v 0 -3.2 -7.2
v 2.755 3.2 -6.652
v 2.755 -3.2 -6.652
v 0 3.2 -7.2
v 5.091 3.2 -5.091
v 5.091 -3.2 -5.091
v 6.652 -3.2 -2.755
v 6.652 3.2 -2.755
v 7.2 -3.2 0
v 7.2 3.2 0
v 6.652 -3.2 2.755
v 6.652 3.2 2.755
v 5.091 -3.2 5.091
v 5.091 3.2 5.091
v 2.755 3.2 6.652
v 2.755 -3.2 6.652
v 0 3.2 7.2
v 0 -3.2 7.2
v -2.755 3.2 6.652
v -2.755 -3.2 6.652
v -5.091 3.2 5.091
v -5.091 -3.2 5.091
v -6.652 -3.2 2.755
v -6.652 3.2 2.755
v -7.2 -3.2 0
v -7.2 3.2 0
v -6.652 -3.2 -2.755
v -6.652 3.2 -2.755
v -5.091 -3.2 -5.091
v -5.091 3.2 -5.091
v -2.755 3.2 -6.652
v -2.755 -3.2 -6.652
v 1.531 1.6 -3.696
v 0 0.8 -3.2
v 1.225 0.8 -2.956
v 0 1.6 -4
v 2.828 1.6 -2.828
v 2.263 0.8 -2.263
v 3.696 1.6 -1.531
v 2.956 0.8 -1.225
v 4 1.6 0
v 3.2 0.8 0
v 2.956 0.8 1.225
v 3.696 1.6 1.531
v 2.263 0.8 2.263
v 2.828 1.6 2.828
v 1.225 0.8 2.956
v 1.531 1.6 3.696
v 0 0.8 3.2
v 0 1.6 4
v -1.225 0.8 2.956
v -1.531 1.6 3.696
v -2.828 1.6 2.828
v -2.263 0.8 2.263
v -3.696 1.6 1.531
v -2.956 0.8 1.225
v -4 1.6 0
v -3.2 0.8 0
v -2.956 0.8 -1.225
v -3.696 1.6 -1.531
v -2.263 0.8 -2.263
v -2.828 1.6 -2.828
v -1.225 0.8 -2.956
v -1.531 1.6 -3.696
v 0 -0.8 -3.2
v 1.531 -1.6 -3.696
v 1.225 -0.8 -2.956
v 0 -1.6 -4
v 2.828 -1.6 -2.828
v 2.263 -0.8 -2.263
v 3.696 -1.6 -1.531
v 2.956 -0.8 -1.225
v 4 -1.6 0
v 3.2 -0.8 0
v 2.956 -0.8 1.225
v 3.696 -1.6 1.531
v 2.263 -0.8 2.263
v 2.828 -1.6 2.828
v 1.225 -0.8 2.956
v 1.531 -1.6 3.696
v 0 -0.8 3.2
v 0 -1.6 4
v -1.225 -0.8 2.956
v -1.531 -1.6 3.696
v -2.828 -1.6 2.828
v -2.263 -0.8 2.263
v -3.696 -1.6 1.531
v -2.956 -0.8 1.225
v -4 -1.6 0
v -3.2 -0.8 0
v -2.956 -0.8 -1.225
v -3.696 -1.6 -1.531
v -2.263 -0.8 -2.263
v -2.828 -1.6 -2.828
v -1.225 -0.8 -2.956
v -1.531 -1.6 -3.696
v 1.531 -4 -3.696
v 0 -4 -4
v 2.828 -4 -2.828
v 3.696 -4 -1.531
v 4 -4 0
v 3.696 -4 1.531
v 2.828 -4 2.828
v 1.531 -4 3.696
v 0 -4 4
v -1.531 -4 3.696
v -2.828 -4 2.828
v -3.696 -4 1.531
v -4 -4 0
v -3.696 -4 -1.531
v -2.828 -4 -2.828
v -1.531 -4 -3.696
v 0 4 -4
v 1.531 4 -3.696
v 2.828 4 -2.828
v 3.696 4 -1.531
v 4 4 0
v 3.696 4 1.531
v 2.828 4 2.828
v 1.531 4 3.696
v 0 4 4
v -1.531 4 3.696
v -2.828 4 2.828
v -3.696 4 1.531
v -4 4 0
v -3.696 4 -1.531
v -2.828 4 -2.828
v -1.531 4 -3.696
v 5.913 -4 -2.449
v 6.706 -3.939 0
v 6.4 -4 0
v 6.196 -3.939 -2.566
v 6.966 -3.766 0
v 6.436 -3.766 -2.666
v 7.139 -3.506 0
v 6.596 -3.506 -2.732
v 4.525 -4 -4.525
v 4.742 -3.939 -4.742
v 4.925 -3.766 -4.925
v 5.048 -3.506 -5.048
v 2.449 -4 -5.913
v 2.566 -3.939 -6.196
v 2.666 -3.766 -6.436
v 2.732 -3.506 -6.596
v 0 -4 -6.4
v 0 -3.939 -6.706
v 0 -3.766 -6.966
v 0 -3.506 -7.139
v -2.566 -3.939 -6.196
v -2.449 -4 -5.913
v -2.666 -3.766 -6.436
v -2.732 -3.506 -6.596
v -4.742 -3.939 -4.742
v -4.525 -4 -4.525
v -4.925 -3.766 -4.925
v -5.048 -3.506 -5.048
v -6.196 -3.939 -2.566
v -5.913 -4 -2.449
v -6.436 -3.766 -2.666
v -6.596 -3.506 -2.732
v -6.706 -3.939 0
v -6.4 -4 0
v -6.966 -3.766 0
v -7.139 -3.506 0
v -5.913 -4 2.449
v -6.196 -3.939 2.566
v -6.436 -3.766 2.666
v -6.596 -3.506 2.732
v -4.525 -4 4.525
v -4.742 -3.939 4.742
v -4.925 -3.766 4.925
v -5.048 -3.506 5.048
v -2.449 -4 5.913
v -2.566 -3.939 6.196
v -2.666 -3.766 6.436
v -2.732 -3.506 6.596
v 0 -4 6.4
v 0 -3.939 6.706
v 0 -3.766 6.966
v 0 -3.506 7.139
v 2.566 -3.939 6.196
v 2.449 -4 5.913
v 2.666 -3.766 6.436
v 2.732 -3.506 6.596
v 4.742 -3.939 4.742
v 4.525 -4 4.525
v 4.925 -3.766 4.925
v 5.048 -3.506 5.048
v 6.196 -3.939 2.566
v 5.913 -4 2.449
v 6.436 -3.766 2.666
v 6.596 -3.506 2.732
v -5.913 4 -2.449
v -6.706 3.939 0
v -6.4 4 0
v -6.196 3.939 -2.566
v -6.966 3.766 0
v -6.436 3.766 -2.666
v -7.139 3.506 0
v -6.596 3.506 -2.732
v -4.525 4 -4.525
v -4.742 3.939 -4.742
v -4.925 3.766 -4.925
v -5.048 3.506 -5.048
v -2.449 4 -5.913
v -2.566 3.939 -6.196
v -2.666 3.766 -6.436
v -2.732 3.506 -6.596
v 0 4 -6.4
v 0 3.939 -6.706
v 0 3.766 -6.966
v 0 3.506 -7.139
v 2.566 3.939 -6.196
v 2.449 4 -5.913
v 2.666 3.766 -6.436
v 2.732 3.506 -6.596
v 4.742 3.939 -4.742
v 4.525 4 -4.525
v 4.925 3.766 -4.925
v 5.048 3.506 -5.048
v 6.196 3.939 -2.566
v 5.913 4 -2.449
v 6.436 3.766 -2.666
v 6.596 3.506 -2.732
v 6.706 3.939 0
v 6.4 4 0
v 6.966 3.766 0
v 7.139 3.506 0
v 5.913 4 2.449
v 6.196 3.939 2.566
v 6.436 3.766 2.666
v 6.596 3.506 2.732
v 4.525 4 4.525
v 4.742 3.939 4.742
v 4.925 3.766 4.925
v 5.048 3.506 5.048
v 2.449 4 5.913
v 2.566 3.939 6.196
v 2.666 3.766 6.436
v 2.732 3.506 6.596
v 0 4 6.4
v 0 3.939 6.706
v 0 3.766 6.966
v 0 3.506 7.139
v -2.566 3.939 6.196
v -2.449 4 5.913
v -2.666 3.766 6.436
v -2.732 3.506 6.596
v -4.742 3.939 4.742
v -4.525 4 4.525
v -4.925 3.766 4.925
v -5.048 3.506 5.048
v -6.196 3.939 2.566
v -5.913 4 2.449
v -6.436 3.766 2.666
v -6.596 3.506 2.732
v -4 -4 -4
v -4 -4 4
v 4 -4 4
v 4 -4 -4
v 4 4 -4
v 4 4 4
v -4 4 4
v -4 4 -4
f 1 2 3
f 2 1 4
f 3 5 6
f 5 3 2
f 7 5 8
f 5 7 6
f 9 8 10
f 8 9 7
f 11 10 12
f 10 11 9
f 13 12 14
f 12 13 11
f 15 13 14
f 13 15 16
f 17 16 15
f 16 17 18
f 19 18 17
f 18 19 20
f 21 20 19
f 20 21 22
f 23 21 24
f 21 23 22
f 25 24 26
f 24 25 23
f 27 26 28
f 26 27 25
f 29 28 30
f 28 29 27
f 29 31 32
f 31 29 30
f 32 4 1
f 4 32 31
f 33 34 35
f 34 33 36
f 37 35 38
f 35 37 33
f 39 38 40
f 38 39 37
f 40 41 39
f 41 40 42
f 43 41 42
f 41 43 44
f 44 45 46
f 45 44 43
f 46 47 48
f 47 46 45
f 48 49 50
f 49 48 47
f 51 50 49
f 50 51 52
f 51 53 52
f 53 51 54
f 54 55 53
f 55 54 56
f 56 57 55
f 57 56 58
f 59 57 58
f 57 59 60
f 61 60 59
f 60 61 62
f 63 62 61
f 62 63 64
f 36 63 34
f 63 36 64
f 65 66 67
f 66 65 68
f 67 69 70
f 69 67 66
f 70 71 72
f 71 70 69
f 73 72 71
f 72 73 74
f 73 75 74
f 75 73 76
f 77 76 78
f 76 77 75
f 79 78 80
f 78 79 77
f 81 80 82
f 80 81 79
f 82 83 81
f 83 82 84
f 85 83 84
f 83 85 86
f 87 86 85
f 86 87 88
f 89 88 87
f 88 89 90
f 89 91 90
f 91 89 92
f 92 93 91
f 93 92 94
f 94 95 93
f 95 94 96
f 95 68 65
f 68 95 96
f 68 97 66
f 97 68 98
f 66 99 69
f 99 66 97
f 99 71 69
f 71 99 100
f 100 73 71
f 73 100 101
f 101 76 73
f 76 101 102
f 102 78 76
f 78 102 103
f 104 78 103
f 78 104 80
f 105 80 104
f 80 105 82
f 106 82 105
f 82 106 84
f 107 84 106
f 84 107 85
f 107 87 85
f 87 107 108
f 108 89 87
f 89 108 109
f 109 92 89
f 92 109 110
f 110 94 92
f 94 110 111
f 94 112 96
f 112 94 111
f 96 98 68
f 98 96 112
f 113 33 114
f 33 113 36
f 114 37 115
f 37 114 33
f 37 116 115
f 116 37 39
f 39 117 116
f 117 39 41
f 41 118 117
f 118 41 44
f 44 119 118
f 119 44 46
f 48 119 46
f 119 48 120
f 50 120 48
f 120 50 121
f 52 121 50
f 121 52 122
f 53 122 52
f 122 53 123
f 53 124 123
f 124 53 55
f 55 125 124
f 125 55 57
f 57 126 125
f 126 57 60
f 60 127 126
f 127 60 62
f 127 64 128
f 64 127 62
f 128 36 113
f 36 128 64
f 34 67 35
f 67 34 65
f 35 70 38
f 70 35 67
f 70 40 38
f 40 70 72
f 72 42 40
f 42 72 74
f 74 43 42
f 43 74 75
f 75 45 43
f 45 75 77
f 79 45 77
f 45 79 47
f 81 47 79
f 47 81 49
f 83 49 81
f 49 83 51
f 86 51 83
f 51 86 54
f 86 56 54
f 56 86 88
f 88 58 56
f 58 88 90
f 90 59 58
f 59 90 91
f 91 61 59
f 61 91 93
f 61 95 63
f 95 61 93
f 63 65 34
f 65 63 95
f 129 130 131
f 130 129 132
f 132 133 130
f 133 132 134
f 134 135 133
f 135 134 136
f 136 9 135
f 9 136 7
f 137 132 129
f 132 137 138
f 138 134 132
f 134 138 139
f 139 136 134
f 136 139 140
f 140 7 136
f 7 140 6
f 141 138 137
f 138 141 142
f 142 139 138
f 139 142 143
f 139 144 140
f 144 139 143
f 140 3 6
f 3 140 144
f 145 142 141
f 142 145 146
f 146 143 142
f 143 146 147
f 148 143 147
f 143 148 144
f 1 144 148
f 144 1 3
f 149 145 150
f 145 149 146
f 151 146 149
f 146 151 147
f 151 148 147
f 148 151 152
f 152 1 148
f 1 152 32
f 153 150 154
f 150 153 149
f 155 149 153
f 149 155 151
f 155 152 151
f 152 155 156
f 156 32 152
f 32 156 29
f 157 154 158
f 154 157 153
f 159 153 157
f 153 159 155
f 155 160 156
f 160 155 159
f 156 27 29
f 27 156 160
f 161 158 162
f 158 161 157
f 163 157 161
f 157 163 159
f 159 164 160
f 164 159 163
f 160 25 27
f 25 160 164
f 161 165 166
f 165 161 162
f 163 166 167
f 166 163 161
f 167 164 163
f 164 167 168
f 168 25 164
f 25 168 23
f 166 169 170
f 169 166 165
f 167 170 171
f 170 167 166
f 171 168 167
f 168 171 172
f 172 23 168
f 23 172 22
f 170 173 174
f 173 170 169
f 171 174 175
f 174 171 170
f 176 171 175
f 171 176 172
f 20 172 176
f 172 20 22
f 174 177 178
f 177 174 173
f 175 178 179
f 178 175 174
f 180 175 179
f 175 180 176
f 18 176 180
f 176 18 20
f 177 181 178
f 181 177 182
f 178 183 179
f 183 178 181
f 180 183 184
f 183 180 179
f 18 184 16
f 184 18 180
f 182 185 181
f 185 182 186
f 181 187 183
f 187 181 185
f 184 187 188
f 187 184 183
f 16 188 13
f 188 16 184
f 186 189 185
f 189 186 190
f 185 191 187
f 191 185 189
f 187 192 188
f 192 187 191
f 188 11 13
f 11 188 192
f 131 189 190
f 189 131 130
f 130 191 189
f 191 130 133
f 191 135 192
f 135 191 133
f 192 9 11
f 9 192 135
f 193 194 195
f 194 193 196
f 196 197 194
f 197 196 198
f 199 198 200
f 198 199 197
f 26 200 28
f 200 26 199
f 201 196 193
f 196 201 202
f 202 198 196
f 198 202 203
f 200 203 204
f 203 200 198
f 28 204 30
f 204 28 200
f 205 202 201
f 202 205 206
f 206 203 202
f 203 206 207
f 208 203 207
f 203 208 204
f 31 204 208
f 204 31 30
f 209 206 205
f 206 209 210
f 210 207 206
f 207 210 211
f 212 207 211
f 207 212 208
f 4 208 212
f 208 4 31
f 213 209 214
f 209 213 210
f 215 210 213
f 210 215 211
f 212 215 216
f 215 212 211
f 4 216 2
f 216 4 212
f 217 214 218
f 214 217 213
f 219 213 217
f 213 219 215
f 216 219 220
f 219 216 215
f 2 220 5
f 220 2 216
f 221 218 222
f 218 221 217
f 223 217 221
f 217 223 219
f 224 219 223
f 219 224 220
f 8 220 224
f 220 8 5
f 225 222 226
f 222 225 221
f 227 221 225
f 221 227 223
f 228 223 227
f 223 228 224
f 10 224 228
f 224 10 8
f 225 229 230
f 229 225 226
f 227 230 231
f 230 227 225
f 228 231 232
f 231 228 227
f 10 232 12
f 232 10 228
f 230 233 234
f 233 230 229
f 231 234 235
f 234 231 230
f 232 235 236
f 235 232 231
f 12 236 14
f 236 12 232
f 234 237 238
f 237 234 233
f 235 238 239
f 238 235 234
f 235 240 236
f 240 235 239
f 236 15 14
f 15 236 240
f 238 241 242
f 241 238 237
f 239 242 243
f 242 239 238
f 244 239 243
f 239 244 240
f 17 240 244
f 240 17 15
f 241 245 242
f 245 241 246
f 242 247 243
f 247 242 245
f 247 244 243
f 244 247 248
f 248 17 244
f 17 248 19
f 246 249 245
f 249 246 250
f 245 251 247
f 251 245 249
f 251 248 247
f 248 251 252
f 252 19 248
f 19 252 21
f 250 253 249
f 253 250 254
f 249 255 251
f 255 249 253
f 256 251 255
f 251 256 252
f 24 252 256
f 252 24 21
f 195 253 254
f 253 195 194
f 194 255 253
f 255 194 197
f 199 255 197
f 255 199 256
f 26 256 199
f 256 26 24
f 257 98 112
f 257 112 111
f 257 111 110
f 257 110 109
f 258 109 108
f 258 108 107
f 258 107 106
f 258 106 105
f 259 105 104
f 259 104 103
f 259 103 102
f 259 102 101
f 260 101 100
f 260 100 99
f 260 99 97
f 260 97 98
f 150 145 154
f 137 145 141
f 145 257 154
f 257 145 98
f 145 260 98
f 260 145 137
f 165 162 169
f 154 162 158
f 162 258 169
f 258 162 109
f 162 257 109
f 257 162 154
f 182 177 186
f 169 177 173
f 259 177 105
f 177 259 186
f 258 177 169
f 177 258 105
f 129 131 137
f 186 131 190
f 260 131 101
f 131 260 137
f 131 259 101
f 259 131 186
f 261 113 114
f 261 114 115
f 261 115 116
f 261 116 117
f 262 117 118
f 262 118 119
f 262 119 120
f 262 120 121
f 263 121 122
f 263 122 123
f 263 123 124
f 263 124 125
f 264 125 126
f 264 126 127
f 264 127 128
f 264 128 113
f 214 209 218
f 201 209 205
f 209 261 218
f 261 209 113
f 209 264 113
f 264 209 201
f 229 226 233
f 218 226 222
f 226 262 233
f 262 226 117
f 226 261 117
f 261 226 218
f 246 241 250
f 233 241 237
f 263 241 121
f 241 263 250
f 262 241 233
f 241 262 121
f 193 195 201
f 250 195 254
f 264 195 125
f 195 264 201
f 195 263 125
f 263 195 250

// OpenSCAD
// file: ../p/4-4edge.scad
use <../lib.scad>
function ldraw_lib__4_4edge() = [
// 0 Circle 1.0
// 0 Name: 4-4edge.dat
// 0 Author: James Jessiman
// 0 !LDRAW_ORG Primitive UPDATE 2017-01
// 0 !LICENSE Licensed under CC BY 4.0 : see CAreadme.txt
// 
// 0 BFC CERTIFY CCW
  [0,"BFC","CERTIFY"],
  [0,"BFC","CCW"],
// 
// 0 !HISTORY 1998-12-15 [PTadmin] Official Update 1998-10
// 0 !HISTORY 2005-12-28 [PTadmin] Official Update 2005-01
// 0 !HISTORY 2007-06-24 [PTadmin] Header formatted for Contributor Agreement
// 0 !HISTORY 2008-07-01 [PTadmin] Official Update 2008-01
// 0 !HISTORY 2017-01-15 [Steffen] BFCed
// 0 !HISTORY 2017-12-30 [PTadmin] Official Update 2017-01
// 
// 
// 2 24 1 0 0 0.9239 0 0.3827
  [2,24,1,0,0,0.9239,0,0.3827],
// 2 24 0.9239 0 0.3827 0.7071 0 0.7071
  [2,24,0.9239,0,0.3827,0.7071,0,0.7071],
// 2 24 0.7071 0 0.7071 0.3827 0 0.9239
  [2,24,0.7071,0,0.7071,0.3827,0,0.9239],
// 2 24 0.3827 0 0.9239 0 0 1
  [2,24,0.3827,0,0.9239,0,0,1],
// 2 24 0 0 1 -0.3827 0 0.9239
  [2,24,0,0,1,-0.3827,0,0.9239],
// 2 24 -0.3827 0 0.9239 -0.7071 0 0.7071
  [2,24,-0.3827,0,0.9239,-0.7071,0,0.7071],
// 2 24 -0.7071 0 0.7071 -0.9239 0 0.3827
  [2,24,-0.7071,0,0.7071,-0.9239,0,0.3827],
// 2 24 -0.9239 0 0.3827 -1 0 -0
  [2,24,-0.9239,0,0.3827,-1,0,-0],
// 2 24 -1 0 -0 -0.9239 0 -0.3827
  [2,24,-1,0,-0,-0.9239,0,-0.3827],
// 2 24 -0.9239 0 -0.3827 -0.7071 0 -0.7071
  [2,24,-0.9239,0,-0.3827,-0.7071,0,-0.7071],
// 2 24 -0.7071 0 -0.7071 -0.3827 0 -0.9239
  [2,24,-0.7071,0,-0.7071,-0.3827,0,-0.9239],
// 2 24 -0.3827 0 -0.9239 0 0 -1
  [2,24,-0.3827,0,-0.9239,0,0,-1],
// 2 24 0 0 -1 0.3827 0 -0.9239
  [2,24,0,0,-1,0.3827,0,-0.9239],
// 2 24 0.3827 0 -0.9239 0.7071 0 -0.7071
  [2,24,0.3827,0,-0.9239,0.7071,0,-0.7071],
// 2 24 0.7071 0 -0.7071 0.9239 0 -0.3827
  [2,24,0.7071,0,-0.7071,0.9239,0,-0.3827],
// 2 24 0.9239 0 -0.3827 1 0 0
  [2,24,0.9239,0,-0.3827,1,0,0],
];
module ldraw_lib__4_4edge(step=0, col=false, unit=2/5, alt=false, line=0.2, solid=!$preview)
    makepoly(ldraw_lib__4_4edge(), step=step, col=col, unit=unit, alt=alt, line=line, solid=solid);
ldraw_lib__4_4edge(line=0.2);
// file: ../p/4-4ndis.scad
use <../lib.scad>
function ldraw_lib__4_4ndis() = [
// 0 Disc Negative 1.0
// 0 Name: 4-4ndis.dat
// 0 Author: James Jessiman
// 0 !LDRAW_ORG Primitive UPDATE 2012-01
// 0 !LICENSE Licensed under CC BY 4.0 : see CAreadme.txt
// 
// 0 BFC CERTIFY CCW
  [0,"BFC","CERTIFY"],
  [0,"BFC","CCW"],
// 
// 0 !HISTORY 2002-03-23 [sbliss] Added BFC statement; compacted code
// 0 !HISTORY 2002-04-25 [PTadmin] Official Update 2002-02
// 0 !HISTORY 2007-06-24 [PTadmin] Header formatted for Contributor Agreement
// 0 !HISTORY 2008-07-01 [PTadmin] Official Update 2008-01
// 0 !HISTORY 2012-02-16 [Philo] Changed to CCW
// 0 !HISTORY 2012-03-30 [PTadmin] Official Update 2012-01
// 
// 
// 3 16 0.9239 0 0.3827 1 0 0 1 0 1
  [3,16,0.9239,0,0.3827,1,0,0,1,0,1],
// 3 16 0.7071 0 0.7071 0.9239 0 0.3827 1 0 1
  [3,16,0.7071,0,0.7071,0.9239,0,0.3827,1,0,1],
// 3 16 0.3827 0 0.9239 0.7071 0 0.7071 1 0 1
  [3,16,0.3827,0,0.9239,0.7071,0,0.7071,1,0,1],
// 3 16 0 0 1 0.3827 0 0.9239 1 0 1
  [3,16,0,0,1,0.3827,0,0.9239,1,0,1],
// 3 16 -0.3827 0 0.9239 0 0 1 -1 0 1
  [3,16,-0.3827,0,0.9239,0,0,1,-1,0,1],
// 3 16 -0.7071 0 0.7071 -0.3827 0 0.9239 -1 0 1
  [3,16,-0.7071,0,0.7071,-0.3827,0,0.9239,-1,0,1],
// 3 16 -0.9239 0 0.3827 -0.7071 0 0.7071 -1 0 1
  [3,16,-0.9239,0,0.3827,-0.7071,0,0.7071,-1,0,1],
// 3 16 -1 0 0 -0.9239 0 0.3827 -1 0 1
  [3,16,-1,0,0,-0.9239,0,0.3827,-1,0,1],
// 3 16 -0.9239 0 -0.3827 -1 0 0 -1 0 -1
  [3,16,-0.9239,0,-0.3827,-1,0,0,-1,0,-1],
// 3 16 -0.7071 0 -0.7071 -0.9239 0 -0.3827 -1 0 -1
  [3,16,-0.7071,0,-0.7071,-0.9239,0,-0.3827,-1,0,-1],
// 3 16 -0.3827 0 -0.9239 -0.7071 0 -0.7071 -1 0 -1
  [3,16,-0.3827,0,-0.9239,-0.7071,0,-0.7071,-1,0,-1],
// 3 16 0 0 -1 -0.3827 0 -0.9239 -1 0 -1
  [3,16,0,0,-1,-0.3827,0,-0.9239,-1,0,-1],
// 3 16 0.3827 0 -0.9239 0 0 -1 1 0 -1
  [3,16,0.3827,0,-0.9239,0,0,-1,1,0,-1],
// 3 16 0.7071 0 -0.7071 0.3827 0 -0.9239 1 0 -1
  [3,16,0.7071,0,-0.7071,0.3827,0,-0.9239,1,0,-1],
// 3 16 0.9239 0 -0.3827 0.7071 0 -0.7071 1 0 -1
  [3,16,0.9239,0,-0.3827,0.7071,0,-0.7071,1,0,-1],
// 3 16 1 0 0 0.9239 0 -0.3827 1 0 -1
  [3,16,1,0,0,0.9239,0,-0.3827,1,0,-1],
];
module ldraw_lib__4_4ndis(step=0, col=false, unit=2/5, alt=false, line=0.2, solid=!$preview)
    makepoly(ldraw_lib__4_4ndis(), step=step, col=col, unit=unit, alt=alt, line=line, solid=solid);
ldraw_lib__4_4ndis(line=0.2);
// file: ../p/4-4cylo.scad
use <../lib.scad>
use <4-4cyli.scad>
use <4-4edge.scad>
function ldraw_lib__4_4cylo() = [
// 0 Cylinder Open 1.0
// 0 Name: 4-4cylo.dat
// 0 Author: Mark Kennedy [mkennedy]
// 0 !LDRAW_ORG Primitive UPDATE 2010-01
// 0 !LICENSE Licensed under CC BY 4.0 : see CAreadme.txt
// 
// 0 BFC CERTIFY CCW
  [0,"BFC","CERTIFY"],
  [0,"BFC","CCW"],
// 
// 0 !HISTORY 2010-04-05 [PTadmin] Official Update 2010-01
// 
// 
// 1 16 0 0 0 1 0 0 0 1 0 0 0 1 4-4edge.dat
  [1,16,0,0,0,1,0,0,0,1,0,0,0,1, ldraw_lib__4_4edge()],
// 1 16 0 1 0 1 0 0 0 1 0 0 0 1 4-4edge.dat
  [1,16,0,1,0,1,0,0,0,1,0,0,0,1, ldraw_lib__4_4edge()],
// 1 16 0 0 0 1 0 0 0 1 0 0 0 1 4-4cyli.dat
  [1,16,0,0,0,1,0,0,0,1,0,0,0,1, ldraw_lib__4_4cyli()],
// 0
];
module ldraw_lib__4_4cylo(step=0, col=false, unit=2/5, alt=false, line=0.2, solid=!$preview)
    makepoly(ldraw_lib__4_4cylo(), step=step, col=col, unit=unit, alt=alt, line=line, solid=solid);
ldraw_lib__4_4cylo(line=0.2);
// file: ../p/4-4cyli.scad
use <../lib.scad>
function ldraw_lib__4_4cyli() = [
// 0 Cylinder 1.0
// 0 Name: 4-4cyli.dat
// 0 Author: James Jessiman
// 0 !LDRAW_ORG Primitive UPDATE 2005-01
// 0 !LICENSE Licensed under CC BY 4.0 : see CAreadme.txt
// 
// 0 BFC CERTIFY CCW
  [0,"BFC","CERTIFY"],
  [0,"BFC","CCW"],
// 
// 0 !HISTORY 1998-12-15 [PTadmin] Official Update 1998-10
// 0 !HISTORY 2002-03-23 [sbliss] Added BFC statement; merged headers from files in distributions LDraw 0.27 and Complete.
// 0 !HISTORY 2002-04-25 [PTadmin] Official Update 2002-02
// 0 !HISTORY 2004-12-14 [guyvivan] BFC CCW
// 0 !HISTORY 2005-12-28 [PTadmin] Official Update 2005-01
// 0 !HISTORY 2007-06-24 [PTadmin] Header formatted for Contributor Agreement
// 0 !HISTORY 2008-07-01 [PTadmin] Official Update 2008-01
// 
// 
// 4 16 1 1 0 0.9239 1 0.3827 0.9239 0 0.3827 1 0 0
  [4,16,1,1,0,0.9239,1,0.3827,0.9239,0,0.3827,1,0,0],
// 5 24 1 0 0 1 1 0 0.9239 0 0.3827 0.9239 0 -0.3827
  [5,24,1,0,0,1,1,0,0.9239,0,0.3827,0.9239,0,-0.3827],
// 4 16 0.9239 1 0.3827 0.7071 1 0.7071 0.7071 0 0.7071 0.9239 0 0.3827
  [4,16,0.9239,1,0.3827,0.7071,1,0.7071,0.7071,0,0.7071,0.9239,0,0.3827],
// 5 24 0.9239 0 0.3827 0.9239 1 0.3827 0.7071 0 0.7071 1 0 0
  [5,24,0.9239,0,0.3827,0.9239,1,0.3827,0.7071,0,0.7071,1,0,0],
// 4 16 0.7071 1 0.7071 0.3827 1 0.9239 0.3827 0 0.9239 0.7071 0 0.7071
  [4,16,0.7071,1,0.7071,0.3827,1,0.9239,0.3827,0,0.9239,0.7071,0,0.7071],
// 5 24 0.7071 0 0.7071 0.7071 1 0.7071 0.3827 0 0.9239 0.9239 0 0.3827
  [5,24,0.7071,0,0.7071,0.7071,1,0.7071,0.3827,0,0.9239,0.9239,0,0.3827],
// 4 16 0.3827 1 0.9239 0 1 1 0 0 1 0.3827 0 0.9239
  [4,16,0.3827,1,0.9239,0,1,1,0,0,1,0.3827,0,0.9239],
// 5 24 0.3827 0 0.9239 0.3827 1 0.9239 0 0 1 0.7071 0 0.7071
  [5,24,0.3827,0,0.9239,0.3827,1,0.9239,0,0,1,0.7071,0,0.7071],
// 4 16 0 1 1 -0.3827 1 0.9239 -0.3827 0 0.9239 0 0 1
  [4,16,0,1,1,-0.3827,1,0.9239,-0.3827,0,0.9239,0,0,1],
// 5 24 0 0 1 0 1 1 -0.3827 0 0.9239 0.3827 0 0.9239
  [5,24,0,0,1,0,1,1,-0.3827,0,0.9239,0.3827,0,0.9239],
// 4 16 -0.3827 1 0.9239 -0.7071 1 0.7071 -0.7071 0 0.7071 -0.3827 0 0.9239
  [4,16,-0.3827,1,0.9239,-0.7071,1,0.7071,-0.7071,0,0.7071,-0.3827,0,0.9239],
// 5 24 -0.3827 0 0.9239 -0.3827 1 0.9239 -0.7071 0 0.7071 0 0 1
  [5,24,-0.3827,0,0.9239,-0.3827,1,0.9239,-0.7071,0,0.7071,0,0,1],
// 4 16 -0.7071 1 0.7071 -0.9239 1 0.3827 -0.9239 0 0.3827 -0.7071 0 0.7071
  [4,16,-0.7071,1,0.7071,-0.9239,1,0.3827,-0.9239,0,0.3827,-0.7071,0,0.7071],
// 5 24 -0.7071 0 0.7071 -0.7071 1 0.7071 -0.9239 0 0.3827 -0.3827 0 0.9239
  [5,24,-0.7071,0,0.7071,-0.7071,1,0.7071,-0.9239,0,0.3827,-0.3827,0,0.9239],
// 4 16 -0.9239 1 0.3827 -1 1 0 -1 0 0 -0.9239 0 0.3827
  [4,16,-0.9239,1,0.3827,-1,1,0,-1,0,0,-0.9239,0,0.3827],
// 5 24 -0.9239 0 0.3827 -0.9239 1 0.3827 -1 0 0 -0.7071 0 0.7071
  [5,24,-0.9239,0,0.3827,-0.9239,1,0.3827,-1,0,0,-0.7071,0,0.7071],
// 4 16 -1 1 0 -0.9239 1 -0.3827 -0.9239 0 -0.3827 -1 0 0
  [4,16,-1,1,0,-0.9239,1,-0.3827,-0.9239,0,-0.3827,-1,0,0],
// 5 24 -1 0 0 -1 1 0 -0.9239 0 -0.3827 -0.9239 0 0.3827
  [5,24,-1,0,0,-1,1,0,-0.9239,0,-0.3827,-0.9239,0,0.3827],
// 4 16 -0.9239 1 -0.3827 -0.7071 1 -0.7071 -0.7071 0 -0.7071 -0.9239 0 -0.3827
  [4,16,-0.9239,1,-0.3827,-0.7071,1,-0.7071,-0.7071,0,-0.7071,-0.9239,0,-0.3827],
// 5 24 -0.9239 0 -0.3827 -0.9239 1 -0.3827 -0.7071 0 -0.7071 -1 0 0
  [5,24,-0.9239,0,-0.3827,-0.9239,1,-0.3827,-0.7071,0,-0.7071,-1,0,0],
// 4 16 -0.7071 1 -0.7071 -0.3827 1 -0.9239 -0.3827 0 -0.9239 -0.7071 0 -0.7071
  [4,16,-0.7071,1,-0.7071,-0.3827,1,-0.9239,-0.3827,0,-0.9239,-0.7071,0,-0.7071],
// 5 24 -0.7071 0 -0.7071 -0.7071 1 -0.7071 -0.3827 0 -0.9239 -0.9239 0 -0.3827
  [5,24,-0.7071,0,-0.7071,-0.7071,1,-0.7071,-0.3827,0,-0.9239,-0.9239,0,-0.3827],
// 4 16 -0.3827 1 -0.9239 0 1 -1 0 0 -1 -0.3827 0 -0.9239
  [4,16,-0.3827,1,-0.9239,0,1,-1,0,0,-1,-0.3827,0,-0.9239],
// 5 24 -0.3827 0 -0.9239 -0.3827 1 -0.9239 0 0 -1 -0.7071 0 -0.7071
  [5,24,-0.3827,0,-0.9239,-0.3827,1,-0.9239,0,0,-1,-0.7071,0,-0.7071],
// 4 16 0 1 -1 0.3827 1 -0.9239 0.3827 0 -0.9239 0 0 -1
  [4,16,0,1,-1,0.3827,1,-0.9239,0.3827,0,-0.9239,0,0,-1],
// 5 24 0 0 -1 0 1 -1 0.3827 0 -0.9239 -0.3827 0 -0.9239
  [5,24,0,0,-1,0,1,-1,0.3827,0,-0.9239,-0.3827,0,-0.9239],
// 4 16 0.3827 1 -0.9239 0.7071 1 -0.7071 0.7071 0 -0.7071 0.3827 0 -0.9239
  [4,16,0.3827,1,-0.9239,0.7071,1,-0.7071,0.7071,0,-0.7071,0.3827,0,-0.9239],
// 5 24 0.3827 0 -0.9239 0.3827 1 -0.9239 0.7071 0 -0.7071 0 0 -1
  [5,24,0.3827,0,-0.9239,0.3827,1,-0.9239,0.7071,0,-0.7071,0,0,-1],
// 4 16 0.7071 1 -0.7071 0.9239 1 -0.3827 0.9239 0 -0.3827 0.7071 0 -0.7071
  [4,16,0.7071,1,-0.7071,0.9239,1,-0.3827,0.9239,0,-0.3827,0.7071,0,-0.7071],
// 5 24 0.7071 0 -0.7071 0.7071 1 -0.7071 0.9239 0 -0.3827 0.3827 0 -0.9239
  [5,24,0.7071,0,-0.7071,0.7071,1,-0.7071,0.9239,0,-0.3827,0.3827,0,-0.9239],
// 4 16 0.9239 1 -0.3827 1 1 0 1 0 0 0.9239 0 -0.3827
  [4,16,0.9239,1,-0.3827,1,1,0,1,0,0,0.9239,0,-0.3827],
// 5 24 0.9239 0 -0.3827 0.9239 1 -0.3827 1 0 0 0.7071 0 -0.7071
  [5,24,0.9239,0,-0.3827,0.9239,1,-0.3827,1,0,0,0.7071,0,-0.7071],
// 0
];
module ldraw_lib__4_4cyli(step=0, col=false, unit=2/5, alt=false, line=0.2, solid=!$preview)
    makepoly(ldraw_lib__4_4cyli(), step=step, col=col, unit=unit, alt=alt, line=line, solid=solid);
ldraw_lib__4_4cyli(line=0.2);
// file: ../p/4-4con4.scad
use <../lib.scad>
function ldraw_lib__4_4con4() = [
// 0 Cone  4 x 1.0
// 0 Name: 4-4con4.dat
// 0 Author: Willy Tschager [Holly-Wood]
// 0 !LDRAW_ORG Primitive UPDATE 2024-01
// 0 !LICENSE Licensed under CC BY 4.0 : see CAreadme.txt
// 
// 0 BFC CERTIFY CCW
  [0,"BFC","CERTIFY"],
  [0,"BFC","CCW"],
// 
// 0 !HISTORY 2003-08-01 [PTadmin] Official Update 2003-02
// 0 !HISTORY 2007-06-24 [PTadmin] Header formatted for Contributor Agreement
// 0 !HISTORY 2008-07-01 [PTadmin] Official Update 2008-01
// 0 !HISTORY 2012-02-16 [Philo] Changed to CCW
// 0 !HISTORY 2012-03-30 [PTadmin] Official Update 2012-01
// 0 !HISTORY 2024-01-07 [Holly-Wood] Complete regeneration, original by jriley
// 0 !HISTORY 2024-01-29 [OrionP] Official Update 2024-01
// 
// 4 16 4 1 0 3.6956 1 1.5308 4.6195 0 1.9135 5 0 0
  [4,16,4,1,0,3.6956,1,1.5308,4.6195,0,1.9135,5,0,0],
// 4 16 3.6956 1 1.5308 2.8284 1 2.8284 3.5355 0 3.5355 4.6195 0 1.9135
  [4,16,3.6956,1,1.5308,2.8284,1,2.8284,3.5355,0,3.5355,4.6195,0,1.9135],
// 4 16 2.8284 1 2.8284 1.5308 1 3.6956 1.9135 0 4.6195 3.5355 0 3.5355
  [4,16,2.8284,1,2.8284,1.5308,1,3.6956,1.9135,0,4.6195,3.5355,0,3.5355],
// 4 16 1.5308 1 3.6956 0 1 4 0 0 5 1.9135 0 4.6195
  [4,16,1.5308,1,3.6956,0,1,4,0,0,5,1.9135,0,4.6195],
// 4 16 0 1 4 -1.5308 1 3.6956 -1.9135 0 4.6195 0 0 5
  [4,16,0,1,4,-1.5308,1,3.6956,-1.9135,0,4.6195,0,0,5],
// 4 16 -1.5308 1 3.6956 -2.8284 1 2.8284 -3.5355 0 3.5355 -1.9135 0 4.6195
  [4,16,-1.5308,1,3.6956,-2.8284,1,2.8284,-3.5355,0,3.5355,-1.9135,0,4.6195],
// 4 16 -2.8284 1 2.8284 -3.6956 1 1.5308 -4.6195 0 1.9135 -3.5355 0 3.5355
  [4,16,-2.8284,1,2.8284,-3.6956,1,1.5308,-4.6195,0,1.9135,-3.5355,0,3.5355],
// 4 16 -3.6956 1 1.5308 -4 1 0 -5 0 0 -4.6195 0 1.9135
  [4,16,-3.6956,1,1.5308,-4,1,0,-5,0,0,-4.6195,0,1.9135],
// 4 16 -4 1 0 -3.6956 1 -1.5308 -4.6195 0 -1.9135 -5 0 0
  [4,16,-4,1,0,-3.6956,1,-1.5308,-4.6195,0,-1.9135,-5,0,0],
// 4 16 -3.6956 1 -1.5308 -2.8284 1 -2.8284 -3.5355 0 -3.5355 -4.6195 0 -1.9135
  [4,16,-3.6956,1,-1.5308,-2.8284,1,-2.8284,-3.5355,0,-3.5355,-4.6195,0,-1.9135],
// 4 16 -2.8284 1 -2.8284 -1.5308 1 -3.6956 -1.9135 0 -4.6195 -3.5355 0 -3.5355
  [4,16,-2.8284,1,-2.8284,-1.5308,1,-3.6956,-1.9135,0,-4.6195,-3.5355,0,-3.5355],
// 4 16 -1.5308 1 -3.6956 0 1 -4 0 0 -5 -1.9135 0 -4.6195
  [4,16,-1.5308,1,-3.6956,0,1,-4,0,0,-5,-1.9135,0,-4.6195],
// 4 16 0 1 -4 1.5308 1 -3.6956 1.9135 0 -4.6195 0 0 -5
  [4,16,0,1,-4,1.5308,1,-3.6956,1.9135,0,-4.6195,0,0,-5],
// 4 16 1.5308 1 -3.6956 2.8284 1 -2.8284 3.5355 0 -3.5355 1.9135 0 -4.6195
  [4,16,1.5308,1,-3.6956,2.8284,1,-2.8284,3.5355,0,-3.5355,1.9135,0,-4.6195],
// 4 16 2.8284 1 -2.8284 3.6956 1 -1.5308 4.6195 0 -1.9135 3.5355 0 -3.5355
  [4,16,2.8284,1,-2.8284,3.6956,1,-1.5308,4.6195,0,-1.9135,3.5355,0,-3.5355],
// 4 16 3.6956 1 -1.5308 4 1 0 5 0 0 4.6195 0 -1.9135
  [4,16,3.6956,1,-1.5308,4,1,0,5,0,0,4.6195,0,-1.9135],
// 0 // conditional lines
// 5 24 4 1 0 5 0 0 3.6956 1 -1.5308 3.6956 1 1.5308
  [5,24,4,1,0,5,0,0,3.6956,1,-1.5308,3.6956,1,1.5308],
// 5 24 3.6956 1 1.5308 4.6195 0 1.9135 4 1 0 2.8284 1 2.8284
  [5,24,3.6956,1,1.5308,4.6195,0,1.9135,4,1,0,2.8284,1,2.8284],
// 5 24 2.8284 1 2.8284 3.5355 0 3.5355 3.6956 1 1.5308 1.5308 1 3.6956
  [5,24,2.8284,1,2.8284,3.5355,0,3.5355,3.6956,1,1.5308,1.5308,1,3.6956],
// 5 24 1.5308 1 3.6956 1.9135 0 4.6195 2.8284 1 2.8284 0 1 4
  [5,24,1.5308,1,3.6956,1.9135,0,4.6195,2.8284,1,2.8284,0,1,4],
// 5 24 0 1 4 0 0 5 1.5308 1 3.6956 -1.5308 1 3.6956
  [5,24,0,1,4,0,0,5,1.5308,1,3.6956,-1.5308,1,3.6956],
// 5 24 -1.5308 1 3.6956 -1.9135 0 4.6195 0 1 4 -2.8284 1 2.8284
  [5,24,-1.5308,1,3.6956,-1.9135,0,4.6195,0,1,4,-2.8284,1,2.8284],
// 5 24 -2.8284 1 2.8284 -3.5355 0 3.5355 -1.5308 1 3.6956 -3.6956 1 1.5308
  [5,24,-2.8284,1,2.8284,-3.5355,0,3.5355,-1.5308,1,3.6956,-3.6956,1,1.5308],
// 5 24 -3.6956 1 1.5308 -4.6195 0 1.9135 -2.8284 1 2.8284 -4 1 0
  [5,24,-3.6956,1,1.5308,-4.6195,0,1.9135,-2.8284,1,2.8284,-4,1,0],
// 5 24 -4 1 0 -5 0 0 -3.6956 1 1.5308 -3.6956 1 -1.5308
  [5,24,-4,1,0,-5,0,0,-3.6956,1,1.5308,-3.6956,1,-1.5308],
// 5 24 -3.6956 1 -1.5308 -4.6195 0 -1.9135 -4 1 0 -2.8284 1 -2.8284
  [5,24,-3.6956,1,-1.5308,-4.6195,0,-1.9135,-4,1,0,-2.8284,1,-2.8284],
// 5 24 -2.8284 1 -2.8284 -3.5355 0 -3.5355 -3.6956 1 -1.5308 -1.5308 1 -3.6956
  [5,24,-2.8284,1,-2.8284,-3.5355,0,-3.5355,-3.6956,1,-1.5308,-1.5308,1,-3.6956],
// 5 24 -1.5308 1 -3.6956 -1.9135 0 -4.6195 -2.8284 1 -2.8284 0 1 -4
  [5,24,-1.5308,1,-3.6956,-1.9135,0,-4.6195,-2.8284,1,-2.8284,0,1,-4],
// 5 24 0 1 -4 0 0 -5 -1.5308 1 -3.6956 1.5308 1 -3.6956
  [5,24,0,1,-4,0,0,-5,-1.5308,1,-3.6956,1.5308,1,-3.6956],
// 5 24 1.5308 1 -3.6956 1.9135 0 -4.6195 0 1 -4 2.8284 1 -2.8284
  [5,24,1.5308,1,-3.6956,1.9135,0,-4.6195,0,1,-4,2.8284,1,-2.8284],
// 5 24 2.8284 1 -2.8284 3.5355 0 -3.5355 1.5308 1 -3.6956 3.6956 1 -1.5308
  [5,24,2.8284,1,-2.8284,3.5355,0,-3.5355,1.5308,1,-3.6956,3.6956,1,-1.5308],
// 5 24 3.6956 1 -1.5308 4.6195 0 -1.9135 2.8284 1 -2.8284 4 1 0
  [5,24,3.6956,1,-1.5308,4.6195,0,-1.9135,2.8284,1,-2.8284,4,1,0],
// 0 // Build by LDPartEditor (PrimGen 2.X)
];
module ldraw_lib__4_4con4(step=0, col=false, unit=2/5, alt=false, line=0.2, solid=!$preview)
    makepoly(ldraw_lib__4_4con4(), step=step, col=col, unit=unit, alt=alt, line=line, solid=solid);
ldraw_lib__4_4con4(line=0.2);
// file: ../p/1-8chrd.scad
use <../lib.scad>
function ldraw_lib__1_8chrd() = [
// 0 Chord 0.125
// 0 Name: 1-8chrd.dat
// 0 Author: Orion Pobursky [OrionP]
// 0 !LDRAW_ORG Primitive UPDATE 2023-05
// 0 !LICENSE Licensed under CC BY 4.0 : see CAreadme.txt
// 
// 0 BFC CERTIFY CCW
  [0,"BFC","CERTIFY"],
  [0,"BFC","CCW"],
// 
// 0 !HISTORY 2004-04-22 [PTadmin] Official Update 2004-02
// 0 !HISTORY 2007-06-22 [PTadmin] Header formatted for Contributor Agreement
// 0 !HISTORY 2008-07-01 [PTadmin] Official Update 2008-01
// 0 !HISTORY 2023-10-27 [OrionP] Rebuilt with PrimGen2, original author westrate
// 0 !HISTORY 2023-10-31 [OrionP] Official Update 2023-05
// 
// 3 16 1 0 0 0.9239 0 0.3827 0.7071 0 0.7071
  [3,16,1,0,0,0.9239,0,0.3827,0.7071,0,0.7071],
];
module ldraw_lib__1_8chrd(step=0, col=false, unit=2/5, alt=false, line=0.2, solid=!$preview)
    makepoly(ldraw_lib__1_8chrd(), step=step, col=col, unit=unit, alt=alt, line=line, solid=solid);
ldraw_lib__1_8chrd(line=0.2);
// main file
use <../lib.scad>
use <../p/1-8chrd.scad>
use <../p/4-4con4.scad>
use <../p/4-4cyli.scad>
use <../p/4-4cylo.scad>
use <../p/4-4ndis.scad>
use <../p/t01o1250.scad>
function ldraw_lib__30028b() = [
// 0 Tyre  8/ 40 x  8 Slick Smooth
// 0 Name: 30028b.dat
// 0 Author: Magnus Forsberg [MagFors]
// 0 !LDRAW_ORG Part UPDATE 2024-09
// 0 !LICENSE Licensed under CC BY 4.0 : see CAreadme.txt
// 
// 0 BFC CERTIFY CCW
  [0,"BFC","CERTIFY"],
  [0,"BFC","CCW"],
// 
// 0 !HISTORY 1998-02-12 [PTadmin] Official Update 1998-02
// 0 !HISTORY 2003-06-08 [jriley] BFC compliant, ring substitutions
// 0 !HISTORY 2004-04-22 [PTadmin] Official Update 2004-02
// 0 !HISTORY 2007-05-25 [PTadmin] Header formatted for Contributor Agreement
// 0 !HISTORY 2008-07-01 [PTadmin] Official Update 2008-01
// 0 !HISTORY 2012-04-29 [Steffen] added 4-4edge
// 0 !HISTORY 2012-08-09 [PTadmin] Official Update 2012-02
// 0 !HISTORY 2024-03-25 [Steffen] corrected orientation by 90 degrees by creating ...b replacement file
// 0 !HISTORY 2024-10-19 [MagFors] Complete rework, original by Thomas Burger
// 0 !HISTORY 2024-10-19 [MagFors] added a soft edge
// 0 !HISTORY 2024-10-27 [OrionP] Official Update 2024-09
// 
// 1 16 0 0 -8 0 0 18 18 0 0 0 16 0 4-4cyli.dat
  [1,16,0,0,-8,0,0,18,18,0,0,0,16,0, ldraw_lib__4_4cyli()],
// 0 BFC INVERTNEXT
  [0,"BFC","INVERTNEXT"],
// 1 16 0 0 4 0 0 2 2 0 0 0 -2 0 4-4con4.dat
  [1,16,0,0,4,0,0,2,2,0,0,0,-2,0, ldraw_lib__4_4con4()],
// 0 BFC INVERTNEXT
  [0,"BFC","INVERTNEXT"],
// 1 16 0 0 -4 0 0 2 2 0 0 0 2 0 4-4con4.dat
  [1,16,0,0,-4,0,0,2,2,0,0,0,2,0, ldraw_lib__4_4con4()],
// 0 BFC INVERTNEXT
  [0,"BFC","INVERTNEXT"],
// 1 16 0 0 -10 0 0 10 10 0 0 0 6 0 4-4cylo.dat
  [1,16,0,0,-10,0,0,10,10,0,0,0,6,0, ldraw_lib__4_4cylo()],
// 0 BFC INVERTNEXT
  [0,"BFC","INVERTNEXT"],
// 1 16 0 0 4 0 0 10 10 0 0 0 6 0 4-4cylo.dat
  [1,16,0,0,4,0,0,10,10,0,0,0,6,0, ldraw_lib__4_4cylo()],
// 0 BFC INVERTNEXT
  [0,"BFC","INVERTNEXT"],
// 1 16 0 0 -2 0 0 8 8 0 0 0 4 0 4-4cylo.dat
  [1,16,0,0,-2,0,0,8,8,0,0,0,4,0, ldraw_lib__4_4cylo()],
// 
// 1 16 0 0 -8 16 0 0 0 0 16 0 -16 0 t01o1250.dat
  [1,16,0,0,-8,16,0,0,0,0,16,0,-16,0, ldraw_lib__t01o1250()],
// 1 16 0 0 8 -16 0 0 0 0 16 0 16 0 t01o1250.dat
  [1,16,0,0,8,-16,0,0,0,0,16,0,16,0, ldraw_lib__t01o1250()],
// 
// 1 16 0 0 -10 0 0 -10 10 0 0 0 1 0 4-4ndis.dat
  [1,16,0,0,-10,0,0,-10,10,0,0,0,1,0, ldraw_lib__4_4ndis()],
// 1 16 0 0 -10 0 0 -16 16 0 0 0 1 0 1-8chrd.dat
  [1,16,0,0,-10,0,0,-16,16,0,0,0,1,0, ldraw_lib__1_8chrd()],
// 1 16 0 0 -10 0 0 16 16 0 0 0 1 0 1-8chrd.dat
  [1,16,0,0,-10,0,0,16,16,0,0,0,1,0, ldraw_lib__1_8chrd()],
// 4 16 0 10 -10 -10 10 -10 -11.3136 11.3136 -10 0 16 -10
  [4,16,0,10,-10,-10,10,-10,-11.3136,11.3136,-10,0,16,-10],
// 4 16 10 10 -10 0 10 -10 0 16 -10 11.3136 11.3136 -10
  [4,16,10,10,-10,0,10,-10,0,16,-10,11.3136,11.3136,-10],
// 1 16 0 0 -10 -16 0 0 0 0 -16 0 1 0 1-8chrd.dat
  [1,16,0,0,-10,-16,0,0,0,0,-16,0,1,0, ldraw_lib__1_8chrd()],
// 1 16 0 0 -10 -16 0 0 0 0 16 0 1 0 1-8chrd.dat
  [1,16,0,0,-10,-16,0,0,0,0,16,0,1,0, ldraw_lib__1_8chrd()],
// 4 16 -10 0 -10 -10 -10 -10 -11.3136 -11.3136 -10 -16 0 -10
  [4,16,-10,0,-10,-10,-10,-10,-11.3136,-11.3136,-10,-16,0,-10],
// 4 16 -10 10 -10 -10 0 -10 -16 0 -10 -11.3136 11.3136 -10
  [4,16,-10,10,-10,-10,0,-10,-16,0,-10,-11.3136,11.3136,-10],
// 1 16 0 0 -10 0 0 16 -16 0 0 0 1 0 1-8chrd.dat
  [1,16,0,0,-10,0,0,16,-16,0,0,0,1,0, ldraw_lib__1_8chrd()],
// 1 16 0 0 -10 0 0 -16 -16 0 0 0 1 0 1-8chrd.dat
  [1,16,0,0,-10,0,0,-16,-16,0,0,0,1,0, ldraw_lib__1_8chrd()],
// 4 16 0 -10 -10 10 -10 -10 11.3136 -11.3136 -10 0 -16 -10
  [4,16,0,-10,-10,10,-10,-10,11.3136,-11.3136,-10,0,-16,-10],
// 4 16 -10 -10 -10 0 -10 -10 0 -16 -10 -11.3136 -11.3136 -10
  [4,16,-10,-10,-10,0,-10,-10,0,-16,-10,-11.3136,-11.3136,-10],
// 1 16 0 0 -10 16 0 0 0 0 16 0 1 0 1-8chrd.dat
  [1,16,0,0,-10,16,0,0,0,0,16,0,1,0, ldraw_lib__1_8chrd()],
// 1 16 0 0 -10 16 0 0 0 0 -16 0 1 0 1-8chrd.dat
  [1,16,0,0,-10,16,0,0,0,0,-16,0,1,0, ldraw_lib__1_8chrd()],
// 4 16 10 0 -10 10 10 -10 11.3136 11.3136 -10 16 0 -10
  [4,16,10,0,-10,10,10,-10,11.3136,11.3136,-10,16,0,-10],
// 4 16 10 -10 -10 10 0 -10 16 0 -10 11.3136 -11.3136 -10
  [4,16,10,-10,-10,10,0,-10,16,0,-10,11.3136,-11.3136,-10],
// 
// 1 16 0 0 10 0 0 10 10 0 0 0 -1 0 4-4ndis.dat
  [1,16,0,0,10,0,0,10,10,0,0,0,-1,0, ldraw_lib__4_4ndis()],
// 1 16 0 0 10 0 0 16 16 0 0 0 -1 0 1-8chrd.dat
  [1,16,0,0,10,0,0,16,16,0,0,0,-1,0, ldraw_lib__1_8chrd()],
// 1 16 0 0 10 0 0 -16 16 0 0 0 -1 0 1-8chrd.dat
  [1,16,0,0,10,0,0,-16,16,0,0,0,-1,0, ldraw_lib__1_8chrd()],
// 4 16 0 10 10 10 10 10 11.3136 11.3136 10 0 16 10
  [4,16,0,10,10,10,10,10,11.3136,11.3136,10,0,16,10],
// 4 16 -10 10 10 0 10 10 0 16 10 -11.3136 11.3136 10
  [4,16,-10,10,10,0,10,10,0,16,10,-11.3136,11.3136,10],
// 1 16 0 0 10 16 0 0 0 0 -16 0 -1 0 1-8chrd.dat
  [1,16,0,0,10,16,0,0,0,0,-16,0,-1,0, ldraw_lib__1_8chrd()],
// 1 16 0 0 10 16 0 0 0 0 16 0 -1 0 1-8chrd.dat
  [1,16,0,0,10,16,0,0,0,0,16,0,-1,0, ldraw_lib__1_8chrd()],
// 4 16 10 0 10 10 -10 10 11.3136 -11.3136 10 16 0 10
  [4,16,10,0,10,10,-10,10,11.3136,-11.3136,10,16,0,10],
// 4 16 10 10 10 10 0 10 16 0 10 11.3136 11.3136 10
  [4,16,10,10,10,10,0,10,16,0,10,11.3136,11.3136,10],
// 1 16 0 0 10 0 0 -16 -16 0 0 0 -1 0 1-8chrd.dat
  [1,16,0,0,10,0,0,-16,-16,0,0,0,-1,0, ldraw_lib__1_8chrd()],
// 1 16 0 0 10 0 0 16 -16 0 0 0 -1 0 1-8chrd.dat
  [1,16,0,0,10,0,0,16,-16,0,0,0,-1,0, ldraw_lib__1_8chrd()],
// 4 16 0 -10 10 -10 -10 10 -11.3136 -11.3136 10 0 -16 10
  [4,16,0,-10,10,-10,-10,10,-11.3136,-11.3136,10,0,-16,10],
// 4 16 10 -10 10 0 -10 10 0 -16 10 11.3136 -11.3136 10
  [4,16,10,-10,10,0,-10,10,0,-16,10,11.3136,-11.3136,10],
// 1 16 0 0 10 -16 0 0 0 0 16 0 -1 0 1-8chrd.dat
  [1,16,0,0,10,-16,0,0,0,0,16,0,-1,0, ldraw_lib__1_8chrd()],
// 1 16 0 0 10 -16 0 0 0 0 -16 0 -1 0 1-8chrd.dat
  [1,16,0,0,10,-16,0,0,0,0,-16,0,-1,0, ldraw_lib__1_8chrd()],
// 4 16 -10 0 10 -10 10 10 -11.3136 11.3136 10 -16 0 10
  [4,16,-10,0,10,-10,10,10,-11.3136,11.3136,10,-16,0,10],
// 4 16 -10 -10 10 -10 0 10 -16 0 10 -11.3136 -11.3136 10
  [4,16,-10,-10,10,-10,0,10,-16,0,10,-11.3136,-11.3136,10],
];
module ldraw_lib__30028b(step=0, col=false, unit=2/5, alt=false, line=0.2, solid=!$preview)
    makepoly(ldraw_lib__30028b(), step=step, col=col, unit=unit, alt=alt, line=line, solid=solid);
ldraw_lib__30028b(line=0.2);
